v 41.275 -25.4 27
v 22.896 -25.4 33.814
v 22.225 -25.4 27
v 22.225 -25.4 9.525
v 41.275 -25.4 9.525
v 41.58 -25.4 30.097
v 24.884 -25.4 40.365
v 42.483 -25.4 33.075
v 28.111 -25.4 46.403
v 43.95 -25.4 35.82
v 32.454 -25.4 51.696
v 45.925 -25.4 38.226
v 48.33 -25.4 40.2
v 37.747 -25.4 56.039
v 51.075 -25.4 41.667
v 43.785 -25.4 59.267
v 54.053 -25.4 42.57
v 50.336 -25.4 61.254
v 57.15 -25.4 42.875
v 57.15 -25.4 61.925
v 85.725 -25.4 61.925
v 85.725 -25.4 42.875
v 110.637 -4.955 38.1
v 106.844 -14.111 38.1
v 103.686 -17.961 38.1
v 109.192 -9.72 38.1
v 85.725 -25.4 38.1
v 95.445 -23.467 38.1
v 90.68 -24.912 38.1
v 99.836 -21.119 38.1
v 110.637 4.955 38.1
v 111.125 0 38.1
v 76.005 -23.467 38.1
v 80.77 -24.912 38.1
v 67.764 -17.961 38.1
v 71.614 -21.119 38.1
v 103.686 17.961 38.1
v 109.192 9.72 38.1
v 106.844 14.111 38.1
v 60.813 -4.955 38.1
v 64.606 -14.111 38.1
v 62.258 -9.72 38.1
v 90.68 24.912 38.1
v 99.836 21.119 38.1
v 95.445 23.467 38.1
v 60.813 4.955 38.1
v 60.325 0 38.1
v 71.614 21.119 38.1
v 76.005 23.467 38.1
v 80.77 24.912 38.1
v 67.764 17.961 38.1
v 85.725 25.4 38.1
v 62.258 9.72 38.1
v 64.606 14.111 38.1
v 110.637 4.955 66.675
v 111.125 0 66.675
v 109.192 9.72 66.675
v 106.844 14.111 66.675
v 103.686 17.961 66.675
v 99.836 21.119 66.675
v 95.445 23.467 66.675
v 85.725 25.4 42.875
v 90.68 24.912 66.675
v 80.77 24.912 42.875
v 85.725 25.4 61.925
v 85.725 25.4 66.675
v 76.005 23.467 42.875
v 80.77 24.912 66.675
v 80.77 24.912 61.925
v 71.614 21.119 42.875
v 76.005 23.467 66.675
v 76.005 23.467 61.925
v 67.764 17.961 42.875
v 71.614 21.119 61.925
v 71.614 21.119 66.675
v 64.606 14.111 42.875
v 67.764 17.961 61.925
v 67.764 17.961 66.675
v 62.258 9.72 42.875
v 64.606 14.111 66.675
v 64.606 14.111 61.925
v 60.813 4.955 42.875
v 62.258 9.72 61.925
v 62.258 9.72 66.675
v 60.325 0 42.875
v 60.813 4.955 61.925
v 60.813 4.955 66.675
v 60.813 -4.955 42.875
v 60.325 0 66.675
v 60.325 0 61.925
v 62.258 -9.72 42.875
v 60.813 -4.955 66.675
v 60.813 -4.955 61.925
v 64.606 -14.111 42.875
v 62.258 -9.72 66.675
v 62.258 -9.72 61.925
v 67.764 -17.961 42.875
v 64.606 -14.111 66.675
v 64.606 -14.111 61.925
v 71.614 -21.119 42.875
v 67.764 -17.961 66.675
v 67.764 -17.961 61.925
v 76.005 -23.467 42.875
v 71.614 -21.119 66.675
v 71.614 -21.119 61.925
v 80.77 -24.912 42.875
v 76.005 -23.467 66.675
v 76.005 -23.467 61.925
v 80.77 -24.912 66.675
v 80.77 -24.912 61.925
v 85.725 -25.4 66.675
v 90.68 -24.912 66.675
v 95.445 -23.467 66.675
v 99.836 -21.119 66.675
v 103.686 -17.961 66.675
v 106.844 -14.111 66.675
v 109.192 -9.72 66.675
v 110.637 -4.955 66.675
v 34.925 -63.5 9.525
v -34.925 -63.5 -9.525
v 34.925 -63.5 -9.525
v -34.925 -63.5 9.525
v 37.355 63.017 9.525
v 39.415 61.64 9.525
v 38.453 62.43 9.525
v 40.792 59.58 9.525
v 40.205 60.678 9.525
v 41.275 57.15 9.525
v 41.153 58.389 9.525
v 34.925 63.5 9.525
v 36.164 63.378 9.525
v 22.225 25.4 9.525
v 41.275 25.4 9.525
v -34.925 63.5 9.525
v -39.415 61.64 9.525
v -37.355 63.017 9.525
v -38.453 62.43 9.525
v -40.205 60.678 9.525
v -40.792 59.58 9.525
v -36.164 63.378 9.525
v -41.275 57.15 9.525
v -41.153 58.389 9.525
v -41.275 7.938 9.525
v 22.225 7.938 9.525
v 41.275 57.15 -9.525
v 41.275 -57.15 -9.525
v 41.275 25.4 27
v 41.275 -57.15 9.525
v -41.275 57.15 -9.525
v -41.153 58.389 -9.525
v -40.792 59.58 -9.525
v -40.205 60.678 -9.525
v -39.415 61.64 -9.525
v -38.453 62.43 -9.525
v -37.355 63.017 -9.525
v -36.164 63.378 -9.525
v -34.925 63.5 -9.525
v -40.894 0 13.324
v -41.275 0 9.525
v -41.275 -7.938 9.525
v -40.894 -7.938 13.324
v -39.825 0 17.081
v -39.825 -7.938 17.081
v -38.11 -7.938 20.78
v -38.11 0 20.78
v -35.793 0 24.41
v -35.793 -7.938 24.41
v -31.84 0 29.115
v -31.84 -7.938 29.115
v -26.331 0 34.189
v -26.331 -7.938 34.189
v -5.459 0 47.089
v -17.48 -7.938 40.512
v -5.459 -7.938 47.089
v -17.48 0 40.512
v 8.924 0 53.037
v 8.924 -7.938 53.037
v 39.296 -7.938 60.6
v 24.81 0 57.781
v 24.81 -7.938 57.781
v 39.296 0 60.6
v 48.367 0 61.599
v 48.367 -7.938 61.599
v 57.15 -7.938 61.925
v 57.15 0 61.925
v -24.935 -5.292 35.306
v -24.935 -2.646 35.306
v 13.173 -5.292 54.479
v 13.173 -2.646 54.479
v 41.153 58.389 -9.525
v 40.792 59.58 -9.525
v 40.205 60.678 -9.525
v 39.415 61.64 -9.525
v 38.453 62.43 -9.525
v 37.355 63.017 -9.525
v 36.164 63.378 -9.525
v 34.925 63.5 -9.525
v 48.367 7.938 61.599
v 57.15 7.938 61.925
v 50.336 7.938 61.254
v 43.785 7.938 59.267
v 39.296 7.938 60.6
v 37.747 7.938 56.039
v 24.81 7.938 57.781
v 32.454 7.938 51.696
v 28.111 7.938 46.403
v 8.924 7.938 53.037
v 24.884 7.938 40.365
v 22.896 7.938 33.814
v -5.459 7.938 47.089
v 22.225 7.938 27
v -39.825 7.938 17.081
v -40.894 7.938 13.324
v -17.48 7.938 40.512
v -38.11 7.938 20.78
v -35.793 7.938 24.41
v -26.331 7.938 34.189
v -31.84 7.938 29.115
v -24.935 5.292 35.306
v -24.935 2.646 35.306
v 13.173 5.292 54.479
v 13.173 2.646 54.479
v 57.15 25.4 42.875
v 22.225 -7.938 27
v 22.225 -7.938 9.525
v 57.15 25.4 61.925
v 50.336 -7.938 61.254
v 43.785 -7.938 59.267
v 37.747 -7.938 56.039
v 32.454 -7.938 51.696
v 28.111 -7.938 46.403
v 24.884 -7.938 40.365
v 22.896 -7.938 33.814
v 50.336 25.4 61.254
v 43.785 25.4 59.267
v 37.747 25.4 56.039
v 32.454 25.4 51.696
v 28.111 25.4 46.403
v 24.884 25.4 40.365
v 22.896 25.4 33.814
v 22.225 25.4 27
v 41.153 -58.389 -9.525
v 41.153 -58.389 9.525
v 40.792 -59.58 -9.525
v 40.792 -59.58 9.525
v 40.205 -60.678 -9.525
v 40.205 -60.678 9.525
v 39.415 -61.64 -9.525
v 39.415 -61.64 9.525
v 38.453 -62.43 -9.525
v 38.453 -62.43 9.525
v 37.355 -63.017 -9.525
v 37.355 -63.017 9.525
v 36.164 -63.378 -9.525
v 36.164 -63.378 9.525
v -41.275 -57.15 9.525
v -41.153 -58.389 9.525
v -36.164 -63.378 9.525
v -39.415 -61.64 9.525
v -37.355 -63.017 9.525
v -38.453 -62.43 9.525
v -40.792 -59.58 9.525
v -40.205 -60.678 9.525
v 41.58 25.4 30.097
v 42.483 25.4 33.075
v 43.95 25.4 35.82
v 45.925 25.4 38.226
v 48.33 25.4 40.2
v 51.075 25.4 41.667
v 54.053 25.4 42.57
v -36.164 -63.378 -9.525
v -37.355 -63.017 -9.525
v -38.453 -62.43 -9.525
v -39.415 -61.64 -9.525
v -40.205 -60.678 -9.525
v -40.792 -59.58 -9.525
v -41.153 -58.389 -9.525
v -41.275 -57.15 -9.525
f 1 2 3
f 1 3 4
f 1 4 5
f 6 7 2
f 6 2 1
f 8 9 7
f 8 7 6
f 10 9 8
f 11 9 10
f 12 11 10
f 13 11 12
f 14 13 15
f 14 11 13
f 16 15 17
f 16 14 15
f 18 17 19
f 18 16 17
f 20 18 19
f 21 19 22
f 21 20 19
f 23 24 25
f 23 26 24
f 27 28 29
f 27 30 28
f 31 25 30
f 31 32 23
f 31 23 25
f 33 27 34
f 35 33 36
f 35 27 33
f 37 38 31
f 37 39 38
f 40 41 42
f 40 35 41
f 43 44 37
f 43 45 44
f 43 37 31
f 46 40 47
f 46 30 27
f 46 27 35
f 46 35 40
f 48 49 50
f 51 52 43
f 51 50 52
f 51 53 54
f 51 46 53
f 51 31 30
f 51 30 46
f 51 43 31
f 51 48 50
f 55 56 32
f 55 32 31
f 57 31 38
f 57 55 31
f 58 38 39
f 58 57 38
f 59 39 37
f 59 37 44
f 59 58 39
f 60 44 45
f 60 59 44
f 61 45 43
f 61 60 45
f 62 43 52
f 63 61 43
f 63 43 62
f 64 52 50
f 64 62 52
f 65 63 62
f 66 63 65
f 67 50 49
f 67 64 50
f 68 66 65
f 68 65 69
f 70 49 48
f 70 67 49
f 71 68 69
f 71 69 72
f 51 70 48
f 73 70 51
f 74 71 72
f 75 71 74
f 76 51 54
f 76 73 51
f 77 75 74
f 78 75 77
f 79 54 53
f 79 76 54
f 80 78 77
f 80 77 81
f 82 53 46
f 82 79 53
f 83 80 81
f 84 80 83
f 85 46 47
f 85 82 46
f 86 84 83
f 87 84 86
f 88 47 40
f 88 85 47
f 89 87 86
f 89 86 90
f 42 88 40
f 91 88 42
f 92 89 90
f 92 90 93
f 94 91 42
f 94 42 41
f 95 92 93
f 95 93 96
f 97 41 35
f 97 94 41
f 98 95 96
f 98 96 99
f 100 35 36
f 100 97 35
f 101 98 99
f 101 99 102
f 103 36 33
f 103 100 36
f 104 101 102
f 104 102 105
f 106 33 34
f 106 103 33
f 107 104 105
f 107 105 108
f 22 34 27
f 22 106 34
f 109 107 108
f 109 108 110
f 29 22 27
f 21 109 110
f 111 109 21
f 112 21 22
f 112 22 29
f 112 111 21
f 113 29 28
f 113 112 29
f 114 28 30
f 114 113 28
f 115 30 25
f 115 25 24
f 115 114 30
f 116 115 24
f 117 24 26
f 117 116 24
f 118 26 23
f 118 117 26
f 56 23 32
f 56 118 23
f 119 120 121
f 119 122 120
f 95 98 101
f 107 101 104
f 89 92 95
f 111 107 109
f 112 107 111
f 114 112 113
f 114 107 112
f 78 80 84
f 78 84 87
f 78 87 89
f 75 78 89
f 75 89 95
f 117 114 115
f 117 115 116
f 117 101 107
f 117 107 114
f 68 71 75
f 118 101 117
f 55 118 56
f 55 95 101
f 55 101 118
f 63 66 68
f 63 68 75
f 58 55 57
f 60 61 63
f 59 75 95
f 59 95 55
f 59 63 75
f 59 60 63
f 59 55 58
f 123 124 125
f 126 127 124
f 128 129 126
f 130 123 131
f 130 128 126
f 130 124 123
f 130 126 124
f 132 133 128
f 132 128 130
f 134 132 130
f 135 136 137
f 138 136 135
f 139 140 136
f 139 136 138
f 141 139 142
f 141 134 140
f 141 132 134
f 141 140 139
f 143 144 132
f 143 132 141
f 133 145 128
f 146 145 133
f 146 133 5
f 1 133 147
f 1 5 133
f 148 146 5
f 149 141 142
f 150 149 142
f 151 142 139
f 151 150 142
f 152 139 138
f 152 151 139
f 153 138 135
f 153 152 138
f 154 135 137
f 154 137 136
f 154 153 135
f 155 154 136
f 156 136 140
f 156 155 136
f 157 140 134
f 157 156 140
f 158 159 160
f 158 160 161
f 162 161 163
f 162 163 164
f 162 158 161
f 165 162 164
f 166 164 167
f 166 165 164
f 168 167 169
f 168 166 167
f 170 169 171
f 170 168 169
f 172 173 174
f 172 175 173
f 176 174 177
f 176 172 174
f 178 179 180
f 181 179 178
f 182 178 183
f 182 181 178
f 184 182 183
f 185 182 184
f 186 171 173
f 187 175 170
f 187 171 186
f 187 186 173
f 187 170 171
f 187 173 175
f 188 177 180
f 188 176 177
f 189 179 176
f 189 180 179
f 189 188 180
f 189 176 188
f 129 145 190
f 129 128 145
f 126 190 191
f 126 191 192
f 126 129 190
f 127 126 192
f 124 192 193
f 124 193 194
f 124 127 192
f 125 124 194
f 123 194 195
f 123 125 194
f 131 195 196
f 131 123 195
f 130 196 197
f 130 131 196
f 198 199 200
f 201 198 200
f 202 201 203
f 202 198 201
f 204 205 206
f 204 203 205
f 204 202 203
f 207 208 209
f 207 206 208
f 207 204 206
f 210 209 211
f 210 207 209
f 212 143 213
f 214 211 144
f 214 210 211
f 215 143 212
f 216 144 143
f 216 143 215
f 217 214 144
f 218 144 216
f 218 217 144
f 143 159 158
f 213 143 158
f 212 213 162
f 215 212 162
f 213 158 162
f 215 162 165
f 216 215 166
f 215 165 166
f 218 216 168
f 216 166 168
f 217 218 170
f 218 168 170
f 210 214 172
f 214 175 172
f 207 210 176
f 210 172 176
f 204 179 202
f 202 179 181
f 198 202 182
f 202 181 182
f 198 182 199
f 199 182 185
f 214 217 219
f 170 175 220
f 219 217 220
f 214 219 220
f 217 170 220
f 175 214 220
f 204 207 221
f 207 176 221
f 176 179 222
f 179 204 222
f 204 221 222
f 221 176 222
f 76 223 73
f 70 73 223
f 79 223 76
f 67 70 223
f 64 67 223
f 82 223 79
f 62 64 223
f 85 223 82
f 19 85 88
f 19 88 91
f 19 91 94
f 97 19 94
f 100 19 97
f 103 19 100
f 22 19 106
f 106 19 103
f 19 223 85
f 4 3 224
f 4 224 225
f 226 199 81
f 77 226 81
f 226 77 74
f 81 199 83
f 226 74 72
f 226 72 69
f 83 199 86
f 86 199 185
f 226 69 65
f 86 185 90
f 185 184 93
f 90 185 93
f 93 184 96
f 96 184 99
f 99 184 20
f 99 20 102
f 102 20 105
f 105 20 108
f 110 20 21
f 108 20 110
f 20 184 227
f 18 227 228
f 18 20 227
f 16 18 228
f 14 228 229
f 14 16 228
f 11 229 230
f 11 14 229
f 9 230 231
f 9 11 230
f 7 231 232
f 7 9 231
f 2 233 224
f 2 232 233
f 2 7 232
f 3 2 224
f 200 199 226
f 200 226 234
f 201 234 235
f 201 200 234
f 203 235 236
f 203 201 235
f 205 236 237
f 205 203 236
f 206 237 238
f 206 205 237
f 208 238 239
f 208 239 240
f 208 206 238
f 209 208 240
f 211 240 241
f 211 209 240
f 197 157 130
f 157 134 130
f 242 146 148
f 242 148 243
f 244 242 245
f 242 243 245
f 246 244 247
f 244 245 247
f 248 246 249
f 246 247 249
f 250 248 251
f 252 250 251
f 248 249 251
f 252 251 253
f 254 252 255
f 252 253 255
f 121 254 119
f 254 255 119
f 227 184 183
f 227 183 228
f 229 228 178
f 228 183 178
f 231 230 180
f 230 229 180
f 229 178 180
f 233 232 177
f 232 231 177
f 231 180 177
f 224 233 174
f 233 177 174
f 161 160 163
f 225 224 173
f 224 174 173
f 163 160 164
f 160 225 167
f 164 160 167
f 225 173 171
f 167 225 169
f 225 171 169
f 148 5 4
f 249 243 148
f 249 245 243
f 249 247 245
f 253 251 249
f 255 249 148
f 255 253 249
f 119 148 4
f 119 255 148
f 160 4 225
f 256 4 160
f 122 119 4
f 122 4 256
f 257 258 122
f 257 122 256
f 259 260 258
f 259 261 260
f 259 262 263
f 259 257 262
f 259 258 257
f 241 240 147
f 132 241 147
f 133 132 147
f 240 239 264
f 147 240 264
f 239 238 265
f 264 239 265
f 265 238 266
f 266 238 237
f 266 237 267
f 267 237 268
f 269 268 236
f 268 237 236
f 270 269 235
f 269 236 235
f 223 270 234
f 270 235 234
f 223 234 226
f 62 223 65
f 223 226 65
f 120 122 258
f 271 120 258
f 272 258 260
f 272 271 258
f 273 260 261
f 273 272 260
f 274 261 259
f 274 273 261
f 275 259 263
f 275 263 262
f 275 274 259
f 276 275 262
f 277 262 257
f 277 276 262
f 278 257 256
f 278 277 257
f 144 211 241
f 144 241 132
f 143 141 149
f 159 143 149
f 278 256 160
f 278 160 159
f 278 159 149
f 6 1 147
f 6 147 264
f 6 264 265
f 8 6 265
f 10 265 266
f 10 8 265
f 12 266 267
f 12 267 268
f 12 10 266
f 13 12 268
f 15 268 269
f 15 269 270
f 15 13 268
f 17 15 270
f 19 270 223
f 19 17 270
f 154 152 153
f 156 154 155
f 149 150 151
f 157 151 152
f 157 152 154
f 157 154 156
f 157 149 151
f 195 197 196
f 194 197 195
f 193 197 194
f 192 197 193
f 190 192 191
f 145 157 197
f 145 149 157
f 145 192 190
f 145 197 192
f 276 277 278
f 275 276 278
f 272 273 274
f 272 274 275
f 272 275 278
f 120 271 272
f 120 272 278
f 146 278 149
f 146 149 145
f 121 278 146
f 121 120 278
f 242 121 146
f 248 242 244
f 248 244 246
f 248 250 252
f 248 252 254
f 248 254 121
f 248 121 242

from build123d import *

# Parameters (mm, degrees)
F1_DEPTH = 63.5
F2_DEPTH = 25.4
F3_DEPTH = 7.9375
F0_W     = 25.4
F0_H     = 19.0500000358
F4_DEPTH = 25.4
F6_R     = 6.35


# Not quite as in the source:
# - a feature names something its author has since deleted; it is built from what else it names


with BuildPart() as f1:
    # F0 (on Front) → F1 (new body, symmetric)
    with BuildSketch(Plane.XZ):
        Polygon((-41.275, 9.525), (-41.275, -9.525), (41.275, -9.525), (41.275, 9.525), (22.2249999642, 9.525), align=None)
    extrude(amount=F1_DEPTH, both=True)

    # F0 (on Front) → F2 (join, symmetric)
    with BuildSketch(Plane.XZ):
        with BuildLine():
            Line((22.2249999642, 9.525), (41.275, 9.525))
            Line((41.275, 9.525), (41.275, 27.0002))
            ThreePointArc((41.275, 27.0002), (45.9246798487, 38.2255201513), (57.15, 42.8752))
            Line((57.15, 42.8752), (60.325, 42.8752))
            Line((60.325, 42.8752), (60.325, 61.9252000358))
            Line((60.325, 61.9252000358), (57.15, 61.9252000358))
            ThreePointArc((57.15, 61.9252000358), (32.4542956418, 51.6959043582), (22.2249999642, 27.0002))
            Line((22.2249999642, 27.0002), (22.2249999642, 9.525))
        make_face()
    extrude(amount=F2_DEPTH, both=True)

    # F0 (on Front) → F3 (join, symmetric)
    with BuildSketch(Plane.XZ):
        with BuildLine():
            add(Edge.make_bspline(
                [(-41.275, 9.525), (-41.1172062159, 36.9034484029), (15.5369872227, 62.0494298637), (57.15, 61.9252000358)],
                knots=[0, 0, 0, 0, 111.5045361803, 111.5045361803, 111.5045361803, 111.5045361803], degree=3))
            Line((-41.275, 9.525), (22.2249999642, 9.525))
            Line((22.2249999642, 9.525), (22.2249999642, 27.0002))
            ThreePointArc((22.2249999642, 27.0002), (32.4542956418, 51.6959043582), (57.15, 61.9252000358))
        make_face()
    extrude(amount=F3_DEPTH, both=True)

    # F0 (on Front) → F4 (join, symmetric)
    with BuildSketch(Plane.XZ):
        with Locations((73.025, 52.4002000179)):
            Rectangle(F0_W, F0_H)
    extrude(amount=F4_DEPTH, both=True)

    # F0 (on Front) → F5 (revolve)
    with BuildSketch(Plane.XZ):
        Polygon((85.725, 66.675), (85.725, 61.9252000358), (85.725, 42.8752), (85.725, 38.1), (111.125, 38.1), (111.125, 66.675), align=None)
    revolve(axis=Axis((85.725, 0, 52.3875), (0, 0, 1)))

    # F6
    f6_edges = [f1.edges().sort_by_distance(p)[0] for p in [
        (41.275, -63.5, 0),
        (-41.275, -63.5, 0),
        (41.275, 63.5, 0),
        (-41.275, 63.5, 0),
    ]]
    fillet(f6_edges, radius=F6_R)


solid = f1.part
